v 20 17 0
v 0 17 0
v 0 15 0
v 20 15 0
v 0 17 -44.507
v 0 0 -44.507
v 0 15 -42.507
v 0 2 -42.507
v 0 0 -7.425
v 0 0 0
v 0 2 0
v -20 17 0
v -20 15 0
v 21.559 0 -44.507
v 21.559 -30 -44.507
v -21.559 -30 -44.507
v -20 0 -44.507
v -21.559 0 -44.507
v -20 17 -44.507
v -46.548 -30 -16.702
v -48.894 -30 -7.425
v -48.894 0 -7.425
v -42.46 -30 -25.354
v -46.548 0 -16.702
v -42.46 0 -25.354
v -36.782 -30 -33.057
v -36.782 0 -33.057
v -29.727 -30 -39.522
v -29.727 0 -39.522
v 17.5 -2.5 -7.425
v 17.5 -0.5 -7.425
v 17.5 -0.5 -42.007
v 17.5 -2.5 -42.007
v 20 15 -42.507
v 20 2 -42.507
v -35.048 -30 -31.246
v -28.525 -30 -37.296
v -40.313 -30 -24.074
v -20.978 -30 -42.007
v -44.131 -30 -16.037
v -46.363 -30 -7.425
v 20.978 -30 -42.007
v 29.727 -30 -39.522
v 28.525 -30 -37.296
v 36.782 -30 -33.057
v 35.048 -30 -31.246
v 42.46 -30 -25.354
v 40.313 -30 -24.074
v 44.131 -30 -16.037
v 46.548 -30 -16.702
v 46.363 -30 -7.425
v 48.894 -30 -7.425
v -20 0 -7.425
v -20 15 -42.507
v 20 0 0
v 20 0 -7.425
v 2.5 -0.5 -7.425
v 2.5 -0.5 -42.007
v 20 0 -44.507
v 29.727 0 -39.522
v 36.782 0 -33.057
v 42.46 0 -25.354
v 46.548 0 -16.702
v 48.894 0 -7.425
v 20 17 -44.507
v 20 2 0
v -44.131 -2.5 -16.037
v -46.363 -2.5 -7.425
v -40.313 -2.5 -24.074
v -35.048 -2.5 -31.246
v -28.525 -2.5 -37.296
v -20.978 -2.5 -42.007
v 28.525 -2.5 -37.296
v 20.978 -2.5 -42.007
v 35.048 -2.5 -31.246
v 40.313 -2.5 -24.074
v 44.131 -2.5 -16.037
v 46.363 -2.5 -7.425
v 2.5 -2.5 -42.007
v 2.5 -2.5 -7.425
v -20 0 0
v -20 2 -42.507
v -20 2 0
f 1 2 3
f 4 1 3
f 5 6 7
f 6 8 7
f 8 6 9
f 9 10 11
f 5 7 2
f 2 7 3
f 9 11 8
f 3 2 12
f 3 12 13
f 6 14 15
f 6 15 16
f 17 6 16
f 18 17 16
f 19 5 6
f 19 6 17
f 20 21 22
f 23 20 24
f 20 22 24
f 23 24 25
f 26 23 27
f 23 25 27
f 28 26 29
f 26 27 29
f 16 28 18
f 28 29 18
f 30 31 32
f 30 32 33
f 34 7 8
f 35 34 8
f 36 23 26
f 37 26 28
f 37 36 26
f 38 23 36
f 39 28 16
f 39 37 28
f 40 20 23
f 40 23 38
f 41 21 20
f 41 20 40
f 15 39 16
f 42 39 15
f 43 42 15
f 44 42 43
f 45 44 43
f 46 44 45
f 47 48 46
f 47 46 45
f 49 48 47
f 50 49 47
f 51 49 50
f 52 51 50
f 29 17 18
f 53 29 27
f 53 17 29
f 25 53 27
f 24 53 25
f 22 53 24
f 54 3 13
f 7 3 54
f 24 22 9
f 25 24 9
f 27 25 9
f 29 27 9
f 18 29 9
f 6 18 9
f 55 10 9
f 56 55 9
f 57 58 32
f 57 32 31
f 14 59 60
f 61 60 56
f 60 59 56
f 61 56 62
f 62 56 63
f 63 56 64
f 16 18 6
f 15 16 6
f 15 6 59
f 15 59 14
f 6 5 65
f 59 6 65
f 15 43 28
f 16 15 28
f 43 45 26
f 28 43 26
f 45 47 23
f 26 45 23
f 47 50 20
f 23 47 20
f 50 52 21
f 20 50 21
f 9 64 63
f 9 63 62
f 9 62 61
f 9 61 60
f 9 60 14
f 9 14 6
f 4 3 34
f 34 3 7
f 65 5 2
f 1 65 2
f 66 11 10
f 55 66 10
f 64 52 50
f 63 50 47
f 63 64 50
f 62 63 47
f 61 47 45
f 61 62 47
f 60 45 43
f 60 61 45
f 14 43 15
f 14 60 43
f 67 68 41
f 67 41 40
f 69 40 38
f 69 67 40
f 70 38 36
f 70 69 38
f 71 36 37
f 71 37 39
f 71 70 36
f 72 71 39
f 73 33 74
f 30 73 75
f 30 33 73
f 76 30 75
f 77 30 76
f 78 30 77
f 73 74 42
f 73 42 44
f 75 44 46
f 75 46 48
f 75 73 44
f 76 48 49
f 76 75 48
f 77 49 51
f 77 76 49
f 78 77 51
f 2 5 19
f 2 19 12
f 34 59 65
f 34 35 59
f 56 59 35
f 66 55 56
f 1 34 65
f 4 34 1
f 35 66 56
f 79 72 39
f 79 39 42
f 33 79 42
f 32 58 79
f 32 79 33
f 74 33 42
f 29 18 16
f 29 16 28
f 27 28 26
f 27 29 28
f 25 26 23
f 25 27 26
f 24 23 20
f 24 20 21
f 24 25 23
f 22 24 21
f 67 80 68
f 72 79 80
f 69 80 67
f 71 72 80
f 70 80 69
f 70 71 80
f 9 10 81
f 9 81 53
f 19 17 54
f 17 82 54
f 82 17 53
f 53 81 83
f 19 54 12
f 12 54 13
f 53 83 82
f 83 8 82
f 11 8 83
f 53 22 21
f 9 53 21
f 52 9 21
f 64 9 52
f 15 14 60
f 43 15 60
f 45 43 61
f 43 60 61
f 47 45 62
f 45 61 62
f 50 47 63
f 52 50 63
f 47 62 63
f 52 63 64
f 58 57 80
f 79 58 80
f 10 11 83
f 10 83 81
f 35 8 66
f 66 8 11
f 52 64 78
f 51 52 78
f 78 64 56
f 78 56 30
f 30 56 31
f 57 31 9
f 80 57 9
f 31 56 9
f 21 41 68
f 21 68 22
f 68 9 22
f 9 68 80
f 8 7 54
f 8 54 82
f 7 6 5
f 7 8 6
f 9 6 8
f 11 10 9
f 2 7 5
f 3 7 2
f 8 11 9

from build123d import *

# Parameters (mm, degrees)
F2_DEPTH    = 20
F3_DEPTH    = 30
F5_T        = 2.5
F5_T3_DEPTH = 42.0824943232
F5_T5_DEPTH = 25


# Not quite as in the source:
# - a shell that OpenCascade refuses in one call is made with other operations: the cavity is built on its own and cut out


with BuildPart() as f2:
    # F1 (on Right) → F2 (new body)
    with BuildSketch(Plane.YZ):
        Polygon((0, 0), (0, -44.507412108), (17, -44.507412108), (17, 0), (15, 0), (15, -42.507412108), (2, -42.507412108), (2, 0), align=None)
    extrude(amount=F2_DEPTH)

    # F0 (on Front) → F3 (join)
    with BuildSketch(Plane.XZ):
        with BuildLine():
            Line((48.8936258571, -7.4249177848), (-48.8936258571, -7.4249177848))
            ThreePointArc((-48.8936258571, -7.4249177848), (-39.8080884955, -29.3433492277), (-21.5593673613, -44.507412108))
            Line((-21.5593673613, -44.507412108), (21.5593673613, -44.507412108))
            ThreePointArc((21.5593673613, -44.507412108), (39.8080884955, -29.3433492277), (48.8936258571, -7.4249177848))
        make_face()
    extrude(amount=F3_DEPTH)


with BuildPart() as f4_1:
    # F4: instance of F2
    add(f2.part.mirror(Plane.YZ))


with BuildPart() as f2_1:
    add(f2.part)

    # F5: shell of thickness 2.5, made by hand


with BuildPart() as f5_core1:
    # F5_t2: copy of F2
    add(f2_1.part)

    # the walls: a layer under each face that stays
    f5_faces = [f5_core1.faces().sort_by_distance(p)[0] for p in [
        (10, 0, -3.7124588924),
        (0, 1.2142857143, -41.3283112431),
        (20, 1.2142857143, -41.3283112431),
        (10, 1, 0),
        (-24.4468129286, 0, -25.9661649464),
        (0, -6.5, -44.507412108),
        (10, 17, -22.253706054),
        (10, 16, 0),
        (10, 15, -21.253706054),
        (10, 8.5, -42.507412108),
        (10, 2, -21.253706054),
        (39.8080884955, -15, -29.3433492277),
        (-39.8080884955, -15, -29.3433492277),
        (34.4468129286, 0, -25.9661649464),
    ]]
    thicken(f5_faces, amount=-F5_T, mode=Mode.SUBTRACT)

    # F5_s4 → F5_t3 (cut)
    with BuildSketch(Plane.XY.offset(-47.007412108)):
        Polygon((-0.025, 0.025), (2.5, 0), (2.5, -2.5), (0, -2.5), align=None)
        Polygon((20.025, 0.025), (17.5, 0), (17.5, -2.5), (20, -2.5), align=None)
    extrude(amount=F5_T3_DEPTH, mode=Mode.SUBTRACT)

    # F5_s6 → F5_t5 (cut)
    with BuildSketch(Plane.YZ.offset(-2.5)):
        Polygon((14.975, -42.482412108), (17.5, -42.507412108), (17.5, -45.007412108), (15, -45.007412108), align=None)
        Polygon((2.025, -42.482412108), (2, -45.007412108), (-0.5, -45.007412108), (-0.5, -42.507412108), align=None)
    extrude(amount=F5_T5_DEPTH, mode=Mode.SUBTRACT)


with BuildPart() as f2_2:
    add(f2_1.part)

    # what is left inside the walls is the cavity
    f5_cavity = [f5_core1.part.solids().sort_by_distance(p)[0] for p in [
        (0, -29.975, -30.479914),
    ]]
    add(f5_cavity, mode=Mode.SUBTRACT)


solid = Compound([f4_1.part, f2_2.part])
